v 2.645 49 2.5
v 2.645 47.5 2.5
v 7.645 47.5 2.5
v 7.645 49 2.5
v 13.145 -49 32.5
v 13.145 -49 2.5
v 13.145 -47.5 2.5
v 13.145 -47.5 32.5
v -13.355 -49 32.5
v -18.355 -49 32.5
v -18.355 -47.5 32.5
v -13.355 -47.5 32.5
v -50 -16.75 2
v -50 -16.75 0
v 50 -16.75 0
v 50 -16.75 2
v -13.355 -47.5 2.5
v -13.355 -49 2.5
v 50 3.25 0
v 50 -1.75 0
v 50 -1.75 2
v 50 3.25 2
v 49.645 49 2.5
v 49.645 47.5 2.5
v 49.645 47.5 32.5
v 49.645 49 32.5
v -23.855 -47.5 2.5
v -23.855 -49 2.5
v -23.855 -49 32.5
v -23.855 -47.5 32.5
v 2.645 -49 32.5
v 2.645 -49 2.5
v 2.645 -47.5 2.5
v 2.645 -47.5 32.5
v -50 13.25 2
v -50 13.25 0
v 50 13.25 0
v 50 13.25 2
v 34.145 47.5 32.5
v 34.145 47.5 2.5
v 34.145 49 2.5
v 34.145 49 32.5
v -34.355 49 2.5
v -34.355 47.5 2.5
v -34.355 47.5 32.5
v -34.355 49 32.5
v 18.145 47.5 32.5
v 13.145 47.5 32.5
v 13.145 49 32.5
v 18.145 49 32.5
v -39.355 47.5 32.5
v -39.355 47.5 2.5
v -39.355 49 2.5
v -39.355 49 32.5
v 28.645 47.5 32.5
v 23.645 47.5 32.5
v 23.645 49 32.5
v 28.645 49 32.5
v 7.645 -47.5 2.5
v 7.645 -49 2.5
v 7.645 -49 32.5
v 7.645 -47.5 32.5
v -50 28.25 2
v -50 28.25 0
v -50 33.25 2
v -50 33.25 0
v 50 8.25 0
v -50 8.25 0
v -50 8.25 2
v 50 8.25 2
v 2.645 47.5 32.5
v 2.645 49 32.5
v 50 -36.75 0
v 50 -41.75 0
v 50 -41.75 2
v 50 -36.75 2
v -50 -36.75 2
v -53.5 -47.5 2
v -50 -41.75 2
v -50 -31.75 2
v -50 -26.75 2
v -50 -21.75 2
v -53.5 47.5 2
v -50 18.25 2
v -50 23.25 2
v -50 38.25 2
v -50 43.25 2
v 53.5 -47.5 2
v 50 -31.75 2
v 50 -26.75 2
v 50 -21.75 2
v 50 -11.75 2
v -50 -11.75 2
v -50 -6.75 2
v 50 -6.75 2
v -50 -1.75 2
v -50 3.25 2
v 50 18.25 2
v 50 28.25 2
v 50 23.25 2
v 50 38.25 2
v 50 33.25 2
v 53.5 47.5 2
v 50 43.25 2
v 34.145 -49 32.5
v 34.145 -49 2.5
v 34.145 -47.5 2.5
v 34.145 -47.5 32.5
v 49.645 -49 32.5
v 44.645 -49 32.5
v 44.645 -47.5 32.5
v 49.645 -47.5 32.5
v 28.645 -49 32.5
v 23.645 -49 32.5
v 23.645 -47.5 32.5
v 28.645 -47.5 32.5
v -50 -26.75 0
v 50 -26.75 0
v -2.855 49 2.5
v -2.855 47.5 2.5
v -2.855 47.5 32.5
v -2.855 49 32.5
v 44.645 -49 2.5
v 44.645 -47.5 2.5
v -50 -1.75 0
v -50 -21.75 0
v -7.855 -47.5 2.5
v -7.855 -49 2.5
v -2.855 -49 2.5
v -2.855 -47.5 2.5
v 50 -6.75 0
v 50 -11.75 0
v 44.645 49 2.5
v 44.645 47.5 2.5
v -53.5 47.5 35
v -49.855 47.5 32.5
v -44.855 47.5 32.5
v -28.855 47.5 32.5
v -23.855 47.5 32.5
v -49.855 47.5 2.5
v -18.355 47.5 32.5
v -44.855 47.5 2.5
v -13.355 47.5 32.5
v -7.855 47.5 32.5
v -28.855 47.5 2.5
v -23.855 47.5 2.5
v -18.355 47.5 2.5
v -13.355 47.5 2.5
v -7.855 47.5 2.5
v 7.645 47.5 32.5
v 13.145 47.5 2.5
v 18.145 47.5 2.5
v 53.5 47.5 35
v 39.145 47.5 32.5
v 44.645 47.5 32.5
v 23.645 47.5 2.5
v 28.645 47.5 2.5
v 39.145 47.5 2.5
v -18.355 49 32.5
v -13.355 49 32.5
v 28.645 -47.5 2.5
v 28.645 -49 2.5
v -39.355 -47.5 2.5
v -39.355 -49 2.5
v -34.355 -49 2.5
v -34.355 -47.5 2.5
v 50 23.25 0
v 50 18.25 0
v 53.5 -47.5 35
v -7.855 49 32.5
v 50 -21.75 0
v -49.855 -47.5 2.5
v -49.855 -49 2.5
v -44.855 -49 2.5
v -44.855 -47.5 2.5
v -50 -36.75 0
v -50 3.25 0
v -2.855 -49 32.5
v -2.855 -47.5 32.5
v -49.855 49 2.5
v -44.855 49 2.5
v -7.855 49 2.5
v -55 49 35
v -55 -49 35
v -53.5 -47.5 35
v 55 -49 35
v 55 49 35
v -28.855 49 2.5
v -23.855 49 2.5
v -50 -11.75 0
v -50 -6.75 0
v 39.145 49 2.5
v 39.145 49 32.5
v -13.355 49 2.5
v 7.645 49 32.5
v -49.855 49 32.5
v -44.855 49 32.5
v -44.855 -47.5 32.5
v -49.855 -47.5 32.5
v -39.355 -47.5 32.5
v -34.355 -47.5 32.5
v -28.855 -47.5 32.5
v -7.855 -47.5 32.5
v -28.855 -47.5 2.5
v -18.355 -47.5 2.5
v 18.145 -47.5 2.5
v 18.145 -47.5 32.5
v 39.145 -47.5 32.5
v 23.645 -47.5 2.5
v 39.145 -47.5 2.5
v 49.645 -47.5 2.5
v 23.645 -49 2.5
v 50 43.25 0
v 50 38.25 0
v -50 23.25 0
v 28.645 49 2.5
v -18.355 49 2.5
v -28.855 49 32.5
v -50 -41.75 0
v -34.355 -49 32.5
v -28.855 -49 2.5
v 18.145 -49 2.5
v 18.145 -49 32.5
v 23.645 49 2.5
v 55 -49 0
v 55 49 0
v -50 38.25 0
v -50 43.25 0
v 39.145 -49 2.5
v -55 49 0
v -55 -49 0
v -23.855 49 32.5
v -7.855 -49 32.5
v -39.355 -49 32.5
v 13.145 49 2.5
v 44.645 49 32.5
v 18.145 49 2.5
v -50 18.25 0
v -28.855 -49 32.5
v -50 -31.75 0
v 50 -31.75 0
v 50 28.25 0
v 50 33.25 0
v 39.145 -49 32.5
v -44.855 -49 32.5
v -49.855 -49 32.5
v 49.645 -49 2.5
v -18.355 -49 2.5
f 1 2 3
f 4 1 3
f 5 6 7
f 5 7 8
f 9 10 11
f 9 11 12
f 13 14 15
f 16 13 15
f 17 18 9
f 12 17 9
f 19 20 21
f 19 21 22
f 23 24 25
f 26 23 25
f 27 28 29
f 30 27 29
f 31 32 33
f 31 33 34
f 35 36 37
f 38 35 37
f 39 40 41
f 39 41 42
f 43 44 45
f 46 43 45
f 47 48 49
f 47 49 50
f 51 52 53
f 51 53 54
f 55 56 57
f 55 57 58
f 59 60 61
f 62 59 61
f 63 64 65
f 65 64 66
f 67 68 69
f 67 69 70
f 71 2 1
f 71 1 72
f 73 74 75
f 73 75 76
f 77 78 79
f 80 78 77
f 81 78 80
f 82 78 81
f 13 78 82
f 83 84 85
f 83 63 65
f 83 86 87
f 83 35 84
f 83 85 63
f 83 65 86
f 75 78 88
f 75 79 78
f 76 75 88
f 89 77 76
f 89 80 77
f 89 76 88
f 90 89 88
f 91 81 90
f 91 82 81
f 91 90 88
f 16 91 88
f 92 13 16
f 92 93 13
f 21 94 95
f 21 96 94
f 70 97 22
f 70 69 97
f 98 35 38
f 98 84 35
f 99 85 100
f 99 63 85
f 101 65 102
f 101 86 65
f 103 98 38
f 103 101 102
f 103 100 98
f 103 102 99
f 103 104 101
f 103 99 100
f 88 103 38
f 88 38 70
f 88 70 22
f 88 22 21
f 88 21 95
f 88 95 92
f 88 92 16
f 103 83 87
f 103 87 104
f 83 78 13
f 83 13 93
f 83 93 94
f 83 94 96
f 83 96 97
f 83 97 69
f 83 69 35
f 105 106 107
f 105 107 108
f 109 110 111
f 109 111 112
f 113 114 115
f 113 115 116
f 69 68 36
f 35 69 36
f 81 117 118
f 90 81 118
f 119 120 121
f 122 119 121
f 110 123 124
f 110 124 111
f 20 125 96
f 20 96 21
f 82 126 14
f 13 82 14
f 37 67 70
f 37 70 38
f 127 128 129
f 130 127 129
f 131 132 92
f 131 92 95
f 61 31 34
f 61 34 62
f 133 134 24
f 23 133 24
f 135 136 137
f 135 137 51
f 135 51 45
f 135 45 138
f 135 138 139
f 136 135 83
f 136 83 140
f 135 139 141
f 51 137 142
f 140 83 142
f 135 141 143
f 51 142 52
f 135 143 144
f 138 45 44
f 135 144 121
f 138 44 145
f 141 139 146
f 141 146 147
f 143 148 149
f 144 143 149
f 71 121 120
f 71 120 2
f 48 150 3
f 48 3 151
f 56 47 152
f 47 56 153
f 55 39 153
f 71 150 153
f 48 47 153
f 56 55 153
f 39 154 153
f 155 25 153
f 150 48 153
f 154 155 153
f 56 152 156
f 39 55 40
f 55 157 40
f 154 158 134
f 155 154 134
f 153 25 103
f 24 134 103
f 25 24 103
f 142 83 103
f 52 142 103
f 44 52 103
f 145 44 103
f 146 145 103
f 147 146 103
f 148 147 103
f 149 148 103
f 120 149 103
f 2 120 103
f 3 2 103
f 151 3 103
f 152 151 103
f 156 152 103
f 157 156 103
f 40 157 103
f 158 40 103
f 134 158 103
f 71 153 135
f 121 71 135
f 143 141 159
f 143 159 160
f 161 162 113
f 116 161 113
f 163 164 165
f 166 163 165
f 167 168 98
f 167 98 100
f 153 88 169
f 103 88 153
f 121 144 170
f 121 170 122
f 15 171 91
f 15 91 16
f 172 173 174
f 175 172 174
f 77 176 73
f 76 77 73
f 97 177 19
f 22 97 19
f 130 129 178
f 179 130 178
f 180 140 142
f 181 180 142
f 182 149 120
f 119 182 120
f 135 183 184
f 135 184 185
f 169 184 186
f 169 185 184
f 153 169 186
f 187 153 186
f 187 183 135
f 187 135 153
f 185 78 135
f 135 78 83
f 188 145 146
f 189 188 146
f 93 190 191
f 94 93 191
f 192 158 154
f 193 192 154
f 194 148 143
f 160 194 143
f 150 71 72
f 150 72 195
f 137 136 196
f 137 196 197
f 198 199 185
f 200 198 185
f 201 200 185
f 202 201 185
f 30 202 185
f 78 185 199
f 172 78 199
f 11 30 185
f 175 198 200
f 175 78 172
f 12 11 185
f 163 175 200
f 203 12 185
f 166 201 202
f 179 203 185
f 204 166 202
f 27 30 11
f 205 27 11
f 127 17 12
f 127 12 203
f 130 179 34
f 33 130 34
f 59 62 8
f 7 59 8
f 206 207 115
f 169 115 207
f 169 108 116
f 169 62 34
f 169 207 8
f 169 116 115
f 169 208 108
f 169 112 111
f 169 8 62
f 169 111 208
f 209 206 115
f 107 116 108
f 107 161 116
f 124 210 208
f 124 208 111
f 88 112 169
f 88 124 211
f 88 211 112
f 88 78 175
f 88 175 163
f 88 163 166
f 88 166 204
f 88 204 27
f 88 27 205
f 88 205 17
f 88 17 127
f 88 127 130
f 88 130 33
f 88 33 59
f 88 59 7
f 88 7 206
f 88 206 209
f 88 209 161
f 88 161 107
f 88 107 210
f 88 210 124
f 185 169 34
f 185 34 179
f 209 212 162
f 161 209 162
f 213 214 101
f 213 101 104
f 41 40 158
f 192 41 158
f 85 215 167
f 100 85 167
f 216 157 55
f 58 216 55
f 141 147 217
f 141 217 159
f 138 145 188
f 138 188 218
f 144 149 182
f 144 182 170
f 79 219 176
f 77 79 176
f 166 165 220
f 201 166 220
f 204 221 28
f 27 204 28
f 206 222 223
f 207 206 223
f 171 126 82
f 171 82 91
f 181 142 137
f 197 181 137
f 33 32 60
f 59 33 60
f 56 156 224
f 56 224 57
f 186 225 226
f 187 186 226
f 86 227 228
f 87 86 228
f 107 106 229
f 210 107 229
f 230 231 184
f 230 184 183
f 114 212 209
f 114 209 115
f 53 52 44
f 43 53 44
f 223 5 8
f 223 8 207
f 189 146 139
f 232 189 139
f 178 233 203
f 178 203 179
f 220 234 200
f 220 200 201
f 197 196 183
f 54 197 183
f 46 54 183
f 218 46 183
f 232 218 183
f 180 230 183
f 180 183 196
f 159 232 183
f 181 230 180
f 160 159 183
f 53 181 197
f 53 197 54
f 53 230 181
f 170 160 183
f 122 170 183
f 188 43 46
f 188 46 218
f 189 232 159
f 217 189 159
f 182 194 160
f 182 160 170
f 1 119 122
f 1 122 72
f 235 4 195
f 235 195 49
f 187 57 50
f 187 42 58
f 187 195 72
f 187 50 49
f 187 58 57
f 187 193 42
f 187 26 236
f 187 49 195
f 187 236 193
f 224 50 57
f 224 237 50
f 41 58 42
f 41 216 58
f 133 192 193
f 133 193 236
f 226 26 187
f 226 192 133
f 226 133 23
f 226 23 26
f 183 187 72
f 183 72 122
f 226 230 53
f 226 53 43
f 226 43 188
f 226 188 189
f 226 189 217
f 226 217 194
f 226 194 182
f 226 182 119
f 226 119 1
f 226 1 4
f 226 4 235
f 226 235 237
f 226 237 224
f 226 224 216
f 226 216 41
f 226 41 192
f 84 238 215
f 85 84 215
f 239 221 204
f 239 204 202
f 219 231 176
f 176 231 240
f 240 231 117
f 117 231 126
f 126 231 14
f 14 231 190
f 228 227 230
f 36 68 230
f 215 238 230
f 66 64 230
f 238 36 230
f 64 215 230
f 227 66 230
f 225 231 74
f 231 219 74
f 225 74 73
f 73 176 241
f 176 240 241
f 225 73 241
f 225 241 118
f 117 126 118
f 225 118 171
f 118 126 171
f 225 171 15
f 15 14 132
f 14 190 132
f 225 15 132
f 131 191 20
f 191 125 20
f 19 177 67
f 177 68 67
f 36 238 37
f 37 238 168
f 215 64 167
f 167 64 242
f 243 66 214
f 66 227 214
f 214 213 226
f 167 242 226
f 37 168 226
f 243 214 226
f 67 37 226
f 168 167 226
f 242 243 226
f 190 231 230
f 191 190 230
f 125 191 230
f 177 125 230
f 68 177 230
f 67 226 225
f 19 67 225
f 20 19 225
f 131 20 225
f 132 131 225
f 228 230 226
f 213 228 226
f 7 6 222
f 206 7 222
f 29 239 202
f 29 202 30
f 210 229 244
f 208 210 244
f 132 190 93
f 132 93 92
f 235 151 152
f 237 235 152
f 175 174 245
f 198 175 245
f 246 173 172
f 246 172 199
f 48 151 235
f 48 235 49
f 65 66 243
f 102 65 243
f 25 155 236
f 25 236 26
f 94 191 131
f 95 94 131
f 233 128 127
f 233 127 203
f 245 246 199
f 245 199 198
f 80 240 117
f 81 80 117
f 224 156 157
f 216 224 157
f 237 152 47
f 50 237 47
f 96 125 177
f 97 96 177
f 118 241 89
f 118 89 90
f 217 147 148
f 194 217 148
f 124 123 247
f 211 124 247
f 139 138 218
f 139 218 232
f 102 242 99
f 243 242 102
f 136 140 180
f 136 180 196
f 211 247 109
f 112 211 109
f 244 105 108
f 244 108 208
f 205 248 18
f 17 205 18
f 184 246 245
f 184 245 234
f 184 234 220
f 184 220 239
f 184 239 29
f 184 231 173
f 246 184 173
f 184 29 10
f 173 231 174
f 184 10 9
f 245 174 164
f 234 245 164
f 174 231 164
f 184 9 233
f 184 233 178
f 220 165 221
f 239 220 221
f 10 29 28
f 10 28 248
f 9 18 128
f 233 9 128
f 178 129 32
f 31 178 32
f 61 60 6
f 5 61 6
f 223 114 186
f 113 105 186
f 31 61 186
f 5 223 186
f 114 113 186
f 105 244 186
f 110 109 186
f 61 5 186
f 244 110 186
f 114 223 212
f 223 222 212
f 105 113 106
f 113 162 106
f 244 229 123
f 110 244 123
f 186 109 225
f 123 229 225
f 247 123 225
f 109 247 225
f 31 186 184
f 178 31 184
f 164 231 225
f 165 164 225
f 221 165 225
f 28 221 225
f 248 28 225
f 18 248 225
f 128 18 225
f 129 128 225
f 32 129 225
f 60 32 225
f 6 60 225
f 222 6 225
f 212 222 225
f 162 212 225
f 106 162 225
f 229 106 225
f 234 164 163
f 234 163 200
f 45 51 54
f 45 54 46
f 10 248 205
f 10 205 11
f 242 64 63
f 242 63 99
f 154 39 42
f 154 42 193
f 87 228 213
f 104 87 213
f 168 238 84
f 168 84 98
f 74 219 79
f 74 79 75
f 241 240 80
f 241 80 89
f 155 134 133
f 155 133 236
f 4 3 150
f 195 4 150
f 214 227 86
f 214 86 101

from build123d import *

# Parameters (mm, degrees)
F0_W     = 110
F0_H     = 98
F0_W_2   = 107
F0_H_2   = 95
F0_W_3   = 100
F0_H_3   = 5
F1_DEPTH = 2
F2_DEPTH = 35
F3_W     = 5
F3_H     = 30
F4_DEPTH = 150


with BuildPart() as f1:
    # F0 (on Top) → F1 (new body)
    with BuildSketch(Plane.XY):
        Rectangle(F0_W, F0_H)
        Rectangle(F0_W_2, F0_H_2, mode=Mode.SUBTRACT)
        Rectangle(F0_W_2, F0_H_2)
        with Locations((0, -39.2500515282)):
            Rectangle(F0_W_3, F0_H_3, mode=Mode.SUBTRACT)
        with Locations((0, -29.2500515282)):
            Rectangle(F0_W_3, F0_H_3, mode=Mode.SUBTRACT)
        with Locations((0, -19.2500515282)):
            Rectangle(F0_W_3, F0_H_3, mode=Mode.SUBTRACT)
        with Locations((0, -9.2500515282)):
            Rectangle(F0_W_3, F0_H_3, mode=Mode.SUBTRACT)
        with Locations((0, 0.7499484718)):
            Rectangle(F0_W_3, F0_H_3, mode=Mode.SUBTRACT)
        with Locations((0, 10.7499484718)):
            Rectangle(F0_W_3, F0_H_3, mode=Mode.SUBTRACT)
        with Locations((0, 20.7499484718)):
            Rectangle(F0_W_3, F0_H_3, mode=Mode.SUBTRACT)
        with Locations((0, 30.7499484718)):
            Rectangle(F0_W_3, F0_H_3, mode=Mode.SUBTRACT)
        with Locations((0, 40.7499484718)):
            Rectangle(F0_W_3, F0_H_3, mode=Mode.SUBTRACT)
    extrude(amount=F1_DEPTH)

    # F0 (on Top) → F2 (join)
    with BuildSketch(Plane.XY):
        Rectangle(F0_W, F0_H)
        Rectangle(F0_W_2, F0_H_2, mode=Mode.SUBTRACT)
    extrude(amount=F2_DEPTH)

    # F3 (on face) → F4 (cut)
    with BuildSketch(Plane.XZ.offset(49)):
        with Locations((-36.8548509181, 17.5)):
            Rectangle(F3_W, F3_H)
        with Locations((-47.3548509181, 17.5)):
            Rectangle(F3_W, F3_H)
        with Locations((-26.3548509181, 17.5)):
            Rectangle(F3_W, F3_H)
        with Locations((-15.8548509181, 17.5)):
            Rectangle(F3_W, F3_H)
        with Locations((-5.3548509181, 17.5)):
            Rectangle(F3_W, F3_H)
        with Locations((5.1451490819, 17.5)):
            Rectangle(F3_W, F3_H)
        with Locations((15.6451490819, 17.5)):
            Rectangle(F3_W, F3_H)
        with Locations((26.1451490819, 17.5)):
            Rectangle(F3_W, F3_H)
        with Locations((36.6451490819, 17.5)):
            Rectangle(F3_W, F3_H)
        with Locations((47.1451490819, 17.5)):
            Rectangle(F3_W, F3_H)
    extrude(amount=-F4_DEPTH, mode=Mode.SUBTRACT)


solid = f1.part
